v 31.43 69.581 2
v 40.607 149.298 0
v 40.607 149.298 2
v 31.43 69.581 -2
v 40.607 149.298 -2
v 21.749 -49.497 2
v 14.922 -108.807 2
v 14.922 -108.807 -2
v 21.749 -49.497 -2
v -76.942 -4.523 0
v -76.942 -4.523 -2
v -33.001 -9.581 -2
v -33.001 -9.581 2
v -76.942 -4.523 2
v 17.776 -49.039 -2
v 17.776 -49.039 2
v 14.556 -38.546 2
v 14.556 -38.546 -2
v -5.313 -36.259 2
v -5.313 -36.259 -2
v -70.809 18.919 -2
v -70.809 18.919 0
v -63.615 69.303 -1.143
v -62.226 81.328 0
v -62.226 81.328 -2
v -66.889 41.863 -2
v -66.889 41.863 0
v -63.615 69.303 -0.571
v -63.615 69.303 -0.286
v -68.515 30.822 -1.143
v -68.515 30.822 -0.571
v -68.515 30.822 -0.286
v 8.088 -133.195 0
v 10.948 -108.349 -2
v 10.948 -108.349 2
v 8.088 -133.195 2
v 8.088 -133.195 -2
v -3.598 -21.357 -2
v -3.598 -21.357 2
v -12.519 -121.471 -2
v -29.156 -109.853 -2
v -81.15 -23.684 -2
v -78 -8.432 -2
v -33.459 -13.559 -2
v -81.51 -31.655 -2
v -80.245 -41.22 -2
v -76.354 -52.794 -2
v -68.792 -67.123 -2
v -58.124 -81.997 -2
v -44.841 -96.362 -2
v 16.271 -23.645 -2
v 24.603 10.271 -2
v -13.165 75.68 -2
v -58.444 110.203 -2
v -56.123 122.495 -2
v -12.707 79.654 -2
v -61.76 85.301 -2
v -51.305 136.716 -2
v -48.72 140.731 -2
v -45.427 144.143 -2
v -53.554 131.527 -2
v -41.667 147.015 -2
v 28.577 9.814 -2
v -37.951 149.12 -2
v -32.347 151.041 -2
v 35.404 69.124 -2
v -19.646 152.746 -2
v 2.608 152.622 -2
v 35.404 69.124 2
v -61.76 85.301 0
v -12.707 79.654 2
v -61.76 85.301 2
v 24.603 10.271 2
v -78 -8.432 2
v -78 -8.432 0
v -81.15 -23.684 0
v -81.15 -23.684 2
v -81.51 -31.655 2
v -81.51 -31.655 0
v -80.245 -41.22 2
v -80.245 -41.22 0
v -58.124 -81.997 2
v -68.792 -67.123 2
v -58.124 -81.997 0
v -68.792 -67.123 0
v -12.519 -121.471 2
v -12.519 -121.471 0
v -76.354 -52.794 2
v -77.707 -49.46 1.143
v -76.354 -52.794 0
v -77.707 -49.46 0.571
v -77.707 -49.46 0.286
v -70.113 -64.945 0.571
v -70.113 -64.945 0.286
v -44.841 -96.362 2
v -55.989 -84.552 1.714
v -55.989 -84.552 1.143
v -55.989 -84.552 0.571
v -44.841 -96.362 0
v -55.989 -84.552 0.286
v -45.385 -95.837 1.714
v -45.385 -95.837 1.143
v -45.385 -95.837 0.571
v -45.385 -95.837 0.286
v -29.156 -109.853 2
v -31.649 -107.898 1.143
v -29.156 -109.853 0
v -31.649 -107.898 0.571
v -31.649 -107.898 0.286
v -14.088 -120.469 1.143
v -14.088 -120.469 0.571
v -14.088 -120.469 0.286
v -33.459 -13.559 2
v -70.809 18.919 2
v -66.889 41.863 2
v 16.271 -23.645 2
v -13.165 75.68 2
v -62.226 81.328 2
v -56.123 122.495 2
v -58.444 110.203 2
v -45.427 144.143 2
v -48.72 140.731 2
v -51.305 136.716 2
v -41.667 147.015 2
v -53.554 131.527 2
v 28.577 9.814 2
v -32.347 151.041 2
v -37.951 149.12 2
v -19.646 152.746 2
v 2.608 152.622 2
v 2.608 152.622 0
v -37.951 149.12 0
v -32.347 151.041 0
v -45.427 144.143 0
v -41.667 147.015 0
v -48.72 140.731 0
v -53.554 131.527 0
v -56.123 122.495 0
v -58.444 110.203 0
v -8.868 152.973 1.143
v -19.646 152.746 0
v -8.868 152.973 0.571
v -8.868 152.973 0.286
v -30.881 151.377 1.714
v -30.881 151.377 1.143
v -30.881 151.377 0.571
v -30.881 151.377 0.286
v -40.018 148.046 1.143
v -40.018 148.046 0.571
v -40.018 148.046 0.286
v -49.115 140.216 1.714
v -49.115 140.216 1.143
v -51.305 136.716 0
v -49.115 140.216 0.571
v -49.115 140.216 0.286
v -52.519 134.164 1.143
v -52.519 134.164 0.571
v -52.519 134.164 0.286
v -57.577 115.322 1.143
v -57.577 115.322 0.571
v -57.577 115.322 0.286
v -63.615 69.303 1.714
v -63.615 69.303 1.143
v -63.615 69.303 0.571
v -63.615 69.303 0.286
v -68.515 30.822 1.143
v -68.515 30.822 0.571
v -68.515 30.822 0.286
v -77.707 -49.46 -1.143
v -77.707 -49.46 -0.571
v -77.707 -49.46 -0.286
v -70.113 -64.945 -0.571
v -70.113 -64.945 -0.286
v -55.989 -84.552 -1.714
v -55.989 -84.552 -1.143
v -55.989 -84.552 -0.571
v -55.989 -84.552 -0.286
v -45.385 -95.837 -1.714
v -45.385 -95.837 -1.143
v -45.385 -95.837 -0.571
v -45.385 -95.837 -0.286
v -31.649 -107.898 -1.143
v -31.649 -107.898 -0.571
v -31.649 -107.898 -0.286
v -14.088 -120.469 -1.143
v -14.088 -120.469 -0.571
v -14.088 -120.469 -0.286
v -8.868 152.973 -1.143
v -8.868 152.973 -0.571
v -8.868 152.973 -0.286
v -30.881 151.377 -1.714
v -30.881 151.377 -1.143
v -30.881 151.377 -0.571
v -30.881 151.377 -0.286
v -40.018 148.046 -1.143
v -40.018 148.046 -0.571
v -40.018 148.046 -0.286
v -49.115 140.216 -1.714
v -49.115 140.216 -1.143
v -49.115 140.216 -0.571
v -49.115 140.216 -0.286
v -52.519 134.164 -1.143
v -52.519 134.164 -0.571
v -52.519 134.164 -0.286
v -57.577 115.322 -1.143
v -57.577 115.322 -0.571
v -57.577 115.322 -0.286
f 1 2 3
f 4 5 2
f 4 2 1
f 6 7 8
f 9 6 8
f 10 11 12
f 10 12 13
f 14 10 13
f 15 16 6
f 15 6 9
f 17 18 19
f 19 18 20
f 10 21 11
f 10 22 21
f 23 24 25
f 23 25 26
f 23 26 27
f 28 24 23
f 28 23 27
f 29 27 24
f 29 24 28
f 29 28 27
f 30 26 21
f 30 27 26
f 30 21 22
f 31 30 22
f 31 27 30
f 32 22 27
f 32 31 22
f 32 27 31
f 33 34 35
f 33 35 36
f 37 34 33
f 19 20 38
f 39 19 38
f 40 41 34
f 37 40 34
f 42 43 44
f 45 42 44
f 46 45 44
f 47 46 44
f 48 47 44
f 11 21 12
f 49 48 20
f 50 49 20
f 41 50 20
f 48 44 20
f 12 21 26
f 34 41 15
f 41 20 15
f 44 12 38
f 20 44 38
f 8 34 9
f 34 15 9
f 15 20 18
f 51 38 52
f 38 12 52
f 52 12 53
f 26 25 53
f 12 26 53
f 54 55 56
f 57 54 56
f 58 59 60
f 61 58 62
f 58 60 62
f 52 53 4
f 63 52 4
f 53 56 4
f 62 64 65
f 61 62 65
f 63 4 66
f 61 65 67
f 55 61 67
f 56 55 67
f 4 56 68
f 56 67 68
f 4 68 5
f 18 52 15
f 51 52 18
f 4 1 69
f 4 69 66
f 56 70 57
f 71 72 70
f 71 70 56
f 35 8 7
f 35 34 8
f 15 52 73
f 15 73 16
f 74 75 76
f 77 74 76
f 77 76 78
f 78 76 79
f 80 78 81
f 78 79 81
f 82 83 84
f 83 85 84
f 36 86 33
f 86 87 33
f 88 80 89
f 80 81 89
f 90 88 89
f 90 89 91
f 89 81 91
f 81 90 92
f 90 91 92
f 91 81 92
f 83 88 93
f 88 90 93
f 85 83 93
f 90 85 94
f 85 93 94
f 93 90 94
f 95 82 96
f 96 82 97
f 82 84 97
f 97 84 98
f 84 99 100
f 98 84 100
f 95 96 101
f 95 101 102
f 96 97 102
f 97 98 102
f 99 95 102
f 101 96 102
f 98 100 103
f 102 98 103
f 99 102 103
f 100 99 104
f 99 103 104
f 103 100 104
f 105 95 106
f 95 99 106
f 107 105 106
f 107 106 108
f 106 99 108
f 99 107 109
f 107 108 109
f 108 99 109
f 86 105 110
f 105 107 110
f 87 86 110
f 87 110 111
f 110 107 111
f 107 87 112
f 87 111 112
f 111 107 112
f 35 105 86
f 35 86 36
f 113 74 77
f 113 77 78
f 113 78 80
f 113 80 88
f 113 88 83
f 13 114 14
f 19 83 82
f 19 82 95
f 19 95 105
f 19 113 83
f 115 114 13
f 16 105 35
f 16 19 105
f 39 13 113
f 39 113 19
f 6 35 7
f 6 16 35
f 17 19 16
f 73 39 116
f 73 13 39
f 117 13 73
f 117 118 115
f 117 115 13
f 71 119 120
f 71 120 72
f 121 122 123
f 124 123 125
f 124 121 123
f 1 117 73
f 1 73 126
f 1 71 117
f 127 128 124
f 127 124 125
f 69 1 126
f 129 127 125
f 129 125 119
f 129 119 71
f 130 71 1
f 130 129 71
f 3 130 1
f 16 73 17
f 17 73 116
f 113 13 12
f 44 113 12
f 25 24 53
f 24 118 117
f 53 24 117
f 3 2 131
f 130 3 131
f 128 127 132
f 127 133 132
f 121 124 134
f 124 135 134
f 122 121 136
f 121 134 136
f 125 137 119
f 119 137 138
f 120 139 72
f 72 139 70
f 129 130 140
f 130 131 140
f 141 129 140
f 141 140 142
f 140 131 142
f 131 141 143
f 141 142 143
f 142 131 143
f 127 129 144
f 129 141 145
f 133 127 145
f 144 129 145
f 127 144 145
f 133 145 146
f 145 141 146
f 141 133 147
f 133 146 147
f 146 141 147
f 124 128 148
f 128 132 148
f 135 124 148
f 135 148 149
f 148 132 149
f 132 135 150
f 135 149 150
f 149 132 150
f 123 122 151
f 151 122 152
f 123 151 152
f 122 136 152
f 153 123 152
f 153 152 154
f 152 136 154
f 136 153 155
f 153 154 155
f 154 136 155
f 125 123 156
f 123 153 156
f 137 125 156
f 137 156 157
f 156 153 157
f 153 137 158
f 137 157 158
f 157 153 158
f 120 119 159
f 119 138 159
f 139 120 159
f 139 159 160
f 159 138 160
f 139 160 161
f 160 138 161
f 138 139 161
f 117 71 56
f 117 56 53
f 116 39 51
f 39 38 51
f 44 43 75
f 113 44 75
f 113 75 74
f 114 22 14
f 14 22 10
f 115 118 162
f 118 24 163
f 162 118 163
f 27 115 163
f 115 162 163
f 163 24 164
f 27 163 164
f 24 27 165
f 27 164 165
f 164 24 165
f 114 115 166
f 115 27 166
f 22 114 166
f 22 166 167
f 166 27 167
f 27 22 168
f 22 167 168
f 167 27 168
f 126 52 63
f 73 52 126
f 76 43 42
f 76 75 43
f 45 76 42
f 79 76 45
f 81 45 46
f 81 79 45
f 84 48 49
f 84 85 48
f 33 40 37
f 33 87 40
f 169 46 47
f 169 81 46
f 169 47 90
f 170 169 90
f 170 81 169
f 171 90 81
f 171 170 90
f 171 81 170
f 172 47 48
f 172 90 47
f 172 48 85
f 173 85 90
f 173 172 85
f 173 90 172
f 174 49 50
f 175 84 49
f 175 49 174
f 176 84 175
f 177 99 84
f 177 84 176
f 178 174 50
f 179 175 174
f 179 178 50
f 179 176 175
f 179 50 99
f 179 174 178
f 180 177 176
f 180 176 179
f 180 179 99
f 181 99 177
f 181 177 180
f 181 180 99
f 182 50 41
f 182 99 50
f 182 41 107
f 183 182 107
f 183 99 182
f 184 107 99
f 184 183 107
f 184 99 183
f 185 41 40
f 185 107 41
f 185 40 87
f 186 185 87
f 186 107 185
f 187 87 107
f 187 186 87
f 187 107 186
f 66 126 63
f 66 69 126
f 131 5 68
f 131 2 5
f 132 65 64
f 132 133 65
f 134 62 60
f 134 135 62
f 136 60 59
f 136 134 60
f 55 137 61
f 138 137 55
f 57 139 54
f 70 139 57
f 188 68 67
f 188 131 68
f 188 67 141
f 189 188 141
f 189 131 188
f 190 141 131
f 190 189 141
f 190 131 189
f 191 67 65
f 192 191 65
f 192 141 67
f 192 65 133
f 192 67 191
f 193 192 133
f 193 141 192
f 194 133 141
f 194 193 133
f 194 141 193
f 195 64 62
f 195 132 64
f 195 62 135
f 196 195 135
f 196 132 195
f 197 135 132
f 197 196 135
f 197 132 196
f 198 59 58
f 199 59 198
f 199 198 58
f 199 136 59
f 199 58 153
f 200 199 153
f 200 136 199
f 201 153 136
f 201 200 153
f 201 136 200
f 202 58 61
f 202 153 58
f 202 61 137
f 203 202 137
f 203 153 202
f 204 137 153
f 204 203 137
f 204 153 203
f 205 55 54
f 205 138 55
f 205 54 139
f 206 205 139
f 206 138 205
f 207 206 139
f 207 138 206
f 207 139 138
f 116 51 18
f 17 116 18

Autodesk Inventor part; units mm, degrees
ref_plane "YZ Plane" through (0, 0, 0) normal (1, 0, 0) x (0, 1, 0)
ref_plane "XZ Plane" through (0, 0, 0) normal (0, 1, 0) x (-1, 0, 0)
ref_plane "XY Plane" through (0, 0, 0) normal (0, 0, 1) x (1, 0, 0)
ref_plane "РабПлоскость1" through (-276.9669, -64.4178, 0) normal (0, 0, 1) x (0.9934395, -0.1143588, 0)
sketch "Эскиз1" plane through (-276.9669, -64.4178, 0) normal (0, 0, 1) x (0.9934395, -0.1143588, 0)
  line L0 (291.0502, 248.6307) -> (221.0654, 248.6307) construction
  line L1 (221.0654, 248.6307) -> (209.9068, 234.7693) construction
  line L2 (209.9068, 234.7693) -> (196.6601, 234.7693) construction
  line L3 (196.6601, 234.7693) -> (196.6601, 175.7756) construction
  line L4 (196.6601, 175.7756) -> (196.6601, 136.8397) construction
  line L5 (196.6601, 136.8397) -> (196.6601, 100.2635) construction
  line L6 (196.6601, 100.2635) -> (185.4513, 58.9679) construction
  line L7 (185.4513, 58.9679) -> (192.5305, 32.4207) construction
  line L8 (192.5305, 32.4207) -> (238.9418, -16.2312) construction
  line L9 (238.9418, -16.2312) -> (291.0502, -35.7278) construction
  spline S0 degree 4 poles (291.0502, 248.6307) (221.0654, 248.6307) (209.9068, 234.7693) (196.6601, 234.7693) (196.6601, 175.7756) (196.6601, 136.8397) (196.6601, 100.2635) (185.4513, 58.9679) (192.5305, 32.4207) (238.9418, -16.2312) (291.0502, -35.7278) knots 1 1 1 1 1 2 3 4 5 6 7 8 8 8 8 8
  line L10 (291.0502, 248.6307) -> (291.0502, -35.7278)
  line L11 (295.0502, 248.6307) -> (291.0502, 248.6307) projected
  line L12 (291.0502, 248.6307) -> (591.0502, 248.6307) construction
  line L13 (291.0502, 248.6307) -> (-95.7817, 248.6307)
  line L14 (295.0502, -35.7278) -> (291.0502, -35.7278) projected
  line L15 (291.0502, -35.7278) -> (207.0762, -35.7278)
  point P0 (267.7832, 95.6688)
extrude "Выдавливание1" add sketch "Эскиз1" along normal mid plane 4
sketch "Эскиз2" plane through (10.9482, -108.3491, 1.5) normal (0.9934395, -0.1143588, 0) x (0, 0, -1)
  line L0 (3, 0) -> (0, 0) projected
  line L1 (0, 0) -> (0, 59.7017)
  line L2 (-0.5, -25.0103) -> (-0.5, 259.3482) projected
  line L3 (3.5, 259.3482) -> (3.5, -25.0103) projected
  line L4 (3, 59.7017) -> (3, 119.4034)
  line L5 (0, 119.4034) -> (0, 179.1051)
  line L6 (0, 179.1051) -> (3, 179.1051)
  line L7 (3, 179.1051) -> (3, 238.8068)
  line L8 (0, 238.8068) -> (0, 298.5085)
  line L9 (0, 298.5085) -> (3, 298.5085) projected
  line L10 (0, 59.7017) -> (3, 59.7017)
  line L11 (3, 119.4034) -> (0, 119.4034)
  line L12 (3, 238.8068) -> (0, 238.8068)
  line L13 (0, 59.7017) -> (0, 119.4034)
  line L14 (0, 179.1051) -> (0, 238.8068)
  line L15 (3, 238.8068) -> (3, 298.5085)
  line L16 (0, 298.5085) -> (3, 298.5085)
  line L17 (0, 0) -> (3, 0)
  line L18 (3, 59.7017) -> (3, 0)
  line L19 (3, 59.7017) -> (0, 59.7017)
  line L20 (0, 119.4034) -> (3, 119.4034)
  line L21 (0, 59.7017) -> (0, 119.4034)
  line L22 (3, 179.1051) -> (0, 179.1051)
  line L23 (0, 238.8068) -> (3, 238.8068)
  line L24 (3, 238.8068) -> (3, 298.5085)
  line L25 (0, 298.5085) -> (3, 298.5085)
  line L26 (0, 238.8068) -> (0, 298.5085)
  line L27 (3, 179.1051) -> (3.5, 179.1051)
  line L28 (3, 119.4034) -> (3.5, 119.4034)
  line L29 (3.5, 179.1051) -> (3.5, 119.4034)
  line L30 (0, 179.1051) -> (-0.5, 179.1051)
  line L31 (-0.5, 179.1051) -> (-0.5, 119.4034)
  line L32 (0, 119.4034) -> (-0.5, 119.4034)
  line L33 (3, 59.7017) -> (3.5, 59.7017)
  line L34 (3.5, 59.7017) -> (3.5, 0)
  line L35 (3, 0) -> (3.5, 0)
  line L36 (0, 0) -> (-0.5, 0)
  line L37 (-0.5, 0) -> (-0.5, 59.7017)
  line L38 (-0.5, 59.7017) -> (0, 59.7017)
  point P0 (1.5, 106.3863)
  point P1 (3.5, -25.0103)
  point P2 (3, 59.7017)
extrude "Выдавливание2" add sketch "Эскиз2" along normal blind 4 contours L0 L1 L10 L18 | L18 L33 L3 L35 | L36 L2 L38 L1 | L11 L5 L6 L27 L3 L28 | L32 L2 L30 L5
sketch "Эскиз3" plane through (-276.9669, -64.4178, 0) normal (0, 0, 1) x (0.9934395, -0.1143588, 0)
  point P0 (267.7832, 95.6688)
sketch "Эскиз4" plane through (-276.9669, -64.4178, 0) normal (0, 0, 1) x (0.9934395, -0.1143588, 0)
  line L0 (-21.9452, -13.2655) -> (34.011, -13.2655) projected
  line L1 (-21.9452, -13.2655) -> (34.011, -13.2655) projected
  line L2 (34.011, -13.2655) -> (34.011, -16.2655) projected
  line L3 (-21.9452, -13.2655) -> (34.011, -13.2655) projected
  line L4 (-21.9452, -16.2655) -> (-21.9452, -13.2655) projected
  line L5 (34.011, -16.2655) -> (-21.9452, -16.2655) projected
  line L6 (-21.9452, -16.2655) -> (-21.9452, -13.2655)
  line L7 (-69.5874, -16.2655) -> (-21.9452, -16.2655)
  line L8 (-21.9452, -13.2655) -> (-69.5874, -13.2655)
  line L9 (-69.5874, -13.2655) -> (-69.5874, -16.2655)
  line L10 (-21.9452, -13.2655) -> (-21.9452, -12.7655)
  line L11 (-21.9452, -12.7655) -> (-69.5874, -12.7655)
  line L12 (-69.5874, -12.7655) -> (-69.5874, -13.2655)
  line L13 (-69.5874, -16.2655) -> (-69.5874, -16.7655)
  line L14 (-69.5874, -16.7655) -> (-21.9452, -16.7655)
  line L15 (-21.9452, -16.7655) -> (-21.9452, -16.2655)
  point P0 (267.7832, 95.6688)
  point P1 (-66.0194, -13.2655)
  dimension "d16" = 0.5
  dimension "d17" = 0.5
extrude "Выдавливание3" cut sketch "Эскиз4" against normal through all both and the other way through all contours L4 L7 L9 L8 | L8 L12 L11 L10 | L15 L14 L13 L7
sketch "Эскиз5" plane through (-276.9669, -64.4178, 0) normal (0, 0, 1) x (0.9934395, -0.1143588, 0)
  line L0 (291.0502, 173.347) -> (291.0502, 169.347) projected
  line L1 (246.0502, 173.347) -> (291.0502, 173.347) projected
  line L2 (246.0502, 173.347) -> (246.0502, 169.347) projected
  line L3 (291.0502, 169.347) -> (246.0502, 169.347) projected
  line L4 (246.0502, 173.347) -> (246.0502, 169.347)
  line L5 (186.6761, 173.347) -> (246.0502, 173.347)
  line L6 (186.6761, 173.347) -> (186.6761, 169.347)
  line L7 (186.6761, 169.347) -> (246.0502, 169.347)
  line L8 (246.0502, 173.347) -> (246.0502, 169.347)
  line L9 (186.6761, 173.347) -> (186.6761, 173.847)
  line L10 (186.6761, 173.847) -> (246.0502, 173.847)
  line L11 (246.0502, 173.847) -> (246.0502, 173.347)
  line L12 (246.0502, 169.347) -> (246.0502, 168.847)
  line L13 (246.0502, 168.847) -> (186.6761, 168.847)
  line L14 (186.6761, 168.847) -> (186.6761, 169.347)
  point P0 (267.7832, 95.6688)
  dimension "d14" = 0.5
  dimension "d15" = 0.5
sketch "Эскиз6" plane through (-276.9669, -64.4178, -2) normal (0, 0, -1) x (-0.9934395, 0.1143588, 0)
  line L0 (16.8024, -31.0891) -> (36.8024, -31.0891)
  line L1 (36.8024, -31.0891) -> (36.8024, -46.0891)
  line L2 (36.8024, -46.0891) -> (16.8024, -46.0891)
  line L3 (16.8024, -46.0891) -> (16.8024, -31.0891)
  line L4 (-286.6513, 74.0401) -> (-286.6513, 59.0401)
  line L5 (-286.6513, 59.0401) -> (-266.6513, 59.0401)
  line L6 (-266.6513, 59.0401) -> (-266.6513, 74.0401)
  line L7 (-266.6513, 74.0401) -> (-286.6513, 74.0401)
  point P0 (-267.7832, 95.6688)
  dimension "d10" = 20
  dimension "d11" = 15
  dimension "d18" = 15
  dimension "d19" = 20
extrude "Выдавливание6" cut sketch "Эскиз6" against normal through all contours L7 L6 L5 L4
ref_plane "РабПлоскость2" through (1.8532, -16.6155, -86.2852) normal (-0.1143588, -0.9934395, 0) x (0, 0, 1)
sketch "Эскиз8" plane through (1.8532, -16.6155, -86.2852) normal (-0.1143588, -0.9934395, 0) x (0, 0, 1)
  line L0 (88.2852, 35.4303) -> (84.2852, 35.4303) projected
  line L1 (84.2852, 35.4303) -> (84.2852, 89.0995)
  line L2 (84.2852, 89.0995) -> (88.2852, 89.0995)
  line L3 (88.2852, 89.0995) -> (88.2852, 35.4303)
  point P0 (86.2852, 3.7412)
extrude "Выдавливание7" cut sketch "Эскиз8" along normal blind 1 and the other way blind 3
extrude "Выдавливание8" cut sketch "Эскиз5" against normal through all both and the other way through all contours L2 L7 L6 L5
properties part number "поперечная_поддержка"
